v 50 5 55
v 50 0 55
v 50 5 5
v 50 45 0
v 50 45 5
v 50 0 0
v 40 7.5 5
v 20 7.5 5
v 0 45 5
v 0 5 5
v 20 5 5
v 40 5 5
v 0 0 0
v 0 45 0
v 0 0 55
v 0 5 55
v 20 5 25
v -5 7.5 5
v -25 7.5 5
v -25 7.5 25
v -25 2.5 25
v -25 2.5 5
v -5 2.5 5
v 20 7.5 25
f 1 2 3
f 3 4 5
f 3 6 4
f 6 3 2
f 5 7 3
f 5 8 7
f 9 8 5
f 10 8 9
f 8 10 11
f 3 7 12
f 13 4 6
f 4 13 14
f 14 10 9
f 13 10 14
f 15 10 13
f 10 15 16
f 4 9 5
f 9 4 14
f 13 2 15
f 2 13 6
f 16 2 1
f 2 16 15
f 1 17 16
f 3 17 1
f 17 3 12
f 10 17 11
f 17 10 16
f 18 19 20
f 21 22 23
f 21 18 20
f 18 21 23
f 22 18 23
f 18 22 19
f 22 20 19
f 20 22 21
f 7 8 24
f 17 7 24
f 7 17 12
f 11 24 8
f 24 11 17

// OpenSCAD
// === NEMA 17 Stepper Motor Mounting Bracket ===
// Print orientation: base plate on bed (XY plane at z=0)

// --- Base plate dimensions ---
base_x_half = 25;        // Half-width in X (x: -25 to 25)
base_y = 45;             // Depth in Y (y: 0 to 45)
base_z = 5;              // Height/thickness in Z (z: 0 to 5)

// --- Base plate mounting holes (M4, 4.5 mm dia) ---
m4_dia = 4.5;
m4_x = 17;               // X position of holes
m4_y = 30;               // Y position of holes

// --- Vertical motor plate dimensions ---
motor_plate_x_half = 25; // Half-width in X (x: -25 to 25)
motor_plate_y = 5;       // Depth in Y (y: 0 to 5)
motor_plate_z = 50;      // Height in Z (z: 0 to 50)

// --- Motor centring boss hole ---
boss_dia = 23;            // Diameter of centring boss hole
boss_x = 0;               // X centre
boss_z = 28;              // Z centre

// --- Motor mounting holes (M3, 3.4 mm dia) on 31 mm square pattern ---
m3_dia = 3.4;
m3_pattern = 31;           // Square pattern size (31 mm)
m3_half = m3_pattern / 2; // Half of pattern size

// --- Triangular gussets ---
gusset_thickness = 5;     // Thickness in X (flush with edges)
gusset_leg_y = 20;        // Leg along +Y
gusset_leg_z = 20;        // Leg along +Z
gusset_corner_y = 5;       // Y of right-angle corner (where plates meet)
gusset_corner_z = 5;       // Z of right-angle corner

// --- Global fineness for round holes ---
$fn = 64;

// --- Build the part ---
module bracket() {
    // Main body: base plate + vertical motor plate
    union() {
        // Base plate
        cube([2 * base_x_half, base_y, base_z], center = [0, 0, 0]);
        
        // Vertical motor plate (standing on back edge of base at y=0)
        translate([0, 0, base_z]) {
            cube([2 * motor_plate_x_half, motor_plate_y, motor_plate_z], center = [0, 0, 0]);
        }
    }
    
    // Triangular gussets (in YZ plane, thickness in X)
    for (x_off = [-base_x_half, base_x_half - gusset_thickness]) {
        translate([x_off, gusset_corner_y, gusset_corner_z]) {
            // Right triangle in YZ plane, legs along +Y and +Z
            // Extrude in X direction for thickness
            linear_extrude(height = gusset_thickness, center = true) {
                // Rotate to put triangle in YZ plane
                rotate([90, 0, 0]) {
                    polygon([[0, 0], [gusset_leg_y, 0], [0, gusset_leg_z]]);
                }
            }
        }
    }
    
    // Cut holes
    difference() {
        // Re-create the full body
        union() {
            cube([2 * base_x_half, base_y, base_z], center = [0, 0, 0]);
            translate([0, 0, base_z]) {
                cube([2 * motor_plate_x_half, motor_plate_y, motor_plate_z], center = [0, 0, 0]);
            }
            
            // Add gussets
            for (x_off = [-base_x_half, base_x_half - gusset_thickness]) {
                translate([x_off, gusset_corner_y, gusset_corner_z]) {
                    rotate([90, 0, 0]) {
                        linear_extrude(height = gusset_thickness, center = true) {
                            polygon([[0, 0], [gusset_leg_y, 0], [0, gusset_leg_z]]);
                        }
                    }
                }
            }
        }
        
        // M4 holes through base plate (extend past both faces)
        for (x_off = [-m4_x, m4_x]) {
            translate([x_off, m4_y, -0.5]) {
                cylinder(d = m4_dia, h = base_z + 1, center = true);
            }
        }
        
        // Boss hole through motor plate (along Y, extend past front/back)
        translate([boss_x, 0, boss_z]) {
            cylinder(d = boss_dia, h = motor_plate_y + 1, center = true, axis = [0, 1, 0]);
        }
        
        // M3 mounting holes through motor plate (along Y)
        for (x_off = [-m3_half, m3_half]) {
            for (z_off = [-m3_half, m3_half]) {
                translate([x_off, 0, boss_z + z_off]) {
                    cylinder(d = m3_dia, h = motor_plate_y + 1, center = true, axis = [0, 1, 0]);
                }
            }
        }
    }
}

bracket();
